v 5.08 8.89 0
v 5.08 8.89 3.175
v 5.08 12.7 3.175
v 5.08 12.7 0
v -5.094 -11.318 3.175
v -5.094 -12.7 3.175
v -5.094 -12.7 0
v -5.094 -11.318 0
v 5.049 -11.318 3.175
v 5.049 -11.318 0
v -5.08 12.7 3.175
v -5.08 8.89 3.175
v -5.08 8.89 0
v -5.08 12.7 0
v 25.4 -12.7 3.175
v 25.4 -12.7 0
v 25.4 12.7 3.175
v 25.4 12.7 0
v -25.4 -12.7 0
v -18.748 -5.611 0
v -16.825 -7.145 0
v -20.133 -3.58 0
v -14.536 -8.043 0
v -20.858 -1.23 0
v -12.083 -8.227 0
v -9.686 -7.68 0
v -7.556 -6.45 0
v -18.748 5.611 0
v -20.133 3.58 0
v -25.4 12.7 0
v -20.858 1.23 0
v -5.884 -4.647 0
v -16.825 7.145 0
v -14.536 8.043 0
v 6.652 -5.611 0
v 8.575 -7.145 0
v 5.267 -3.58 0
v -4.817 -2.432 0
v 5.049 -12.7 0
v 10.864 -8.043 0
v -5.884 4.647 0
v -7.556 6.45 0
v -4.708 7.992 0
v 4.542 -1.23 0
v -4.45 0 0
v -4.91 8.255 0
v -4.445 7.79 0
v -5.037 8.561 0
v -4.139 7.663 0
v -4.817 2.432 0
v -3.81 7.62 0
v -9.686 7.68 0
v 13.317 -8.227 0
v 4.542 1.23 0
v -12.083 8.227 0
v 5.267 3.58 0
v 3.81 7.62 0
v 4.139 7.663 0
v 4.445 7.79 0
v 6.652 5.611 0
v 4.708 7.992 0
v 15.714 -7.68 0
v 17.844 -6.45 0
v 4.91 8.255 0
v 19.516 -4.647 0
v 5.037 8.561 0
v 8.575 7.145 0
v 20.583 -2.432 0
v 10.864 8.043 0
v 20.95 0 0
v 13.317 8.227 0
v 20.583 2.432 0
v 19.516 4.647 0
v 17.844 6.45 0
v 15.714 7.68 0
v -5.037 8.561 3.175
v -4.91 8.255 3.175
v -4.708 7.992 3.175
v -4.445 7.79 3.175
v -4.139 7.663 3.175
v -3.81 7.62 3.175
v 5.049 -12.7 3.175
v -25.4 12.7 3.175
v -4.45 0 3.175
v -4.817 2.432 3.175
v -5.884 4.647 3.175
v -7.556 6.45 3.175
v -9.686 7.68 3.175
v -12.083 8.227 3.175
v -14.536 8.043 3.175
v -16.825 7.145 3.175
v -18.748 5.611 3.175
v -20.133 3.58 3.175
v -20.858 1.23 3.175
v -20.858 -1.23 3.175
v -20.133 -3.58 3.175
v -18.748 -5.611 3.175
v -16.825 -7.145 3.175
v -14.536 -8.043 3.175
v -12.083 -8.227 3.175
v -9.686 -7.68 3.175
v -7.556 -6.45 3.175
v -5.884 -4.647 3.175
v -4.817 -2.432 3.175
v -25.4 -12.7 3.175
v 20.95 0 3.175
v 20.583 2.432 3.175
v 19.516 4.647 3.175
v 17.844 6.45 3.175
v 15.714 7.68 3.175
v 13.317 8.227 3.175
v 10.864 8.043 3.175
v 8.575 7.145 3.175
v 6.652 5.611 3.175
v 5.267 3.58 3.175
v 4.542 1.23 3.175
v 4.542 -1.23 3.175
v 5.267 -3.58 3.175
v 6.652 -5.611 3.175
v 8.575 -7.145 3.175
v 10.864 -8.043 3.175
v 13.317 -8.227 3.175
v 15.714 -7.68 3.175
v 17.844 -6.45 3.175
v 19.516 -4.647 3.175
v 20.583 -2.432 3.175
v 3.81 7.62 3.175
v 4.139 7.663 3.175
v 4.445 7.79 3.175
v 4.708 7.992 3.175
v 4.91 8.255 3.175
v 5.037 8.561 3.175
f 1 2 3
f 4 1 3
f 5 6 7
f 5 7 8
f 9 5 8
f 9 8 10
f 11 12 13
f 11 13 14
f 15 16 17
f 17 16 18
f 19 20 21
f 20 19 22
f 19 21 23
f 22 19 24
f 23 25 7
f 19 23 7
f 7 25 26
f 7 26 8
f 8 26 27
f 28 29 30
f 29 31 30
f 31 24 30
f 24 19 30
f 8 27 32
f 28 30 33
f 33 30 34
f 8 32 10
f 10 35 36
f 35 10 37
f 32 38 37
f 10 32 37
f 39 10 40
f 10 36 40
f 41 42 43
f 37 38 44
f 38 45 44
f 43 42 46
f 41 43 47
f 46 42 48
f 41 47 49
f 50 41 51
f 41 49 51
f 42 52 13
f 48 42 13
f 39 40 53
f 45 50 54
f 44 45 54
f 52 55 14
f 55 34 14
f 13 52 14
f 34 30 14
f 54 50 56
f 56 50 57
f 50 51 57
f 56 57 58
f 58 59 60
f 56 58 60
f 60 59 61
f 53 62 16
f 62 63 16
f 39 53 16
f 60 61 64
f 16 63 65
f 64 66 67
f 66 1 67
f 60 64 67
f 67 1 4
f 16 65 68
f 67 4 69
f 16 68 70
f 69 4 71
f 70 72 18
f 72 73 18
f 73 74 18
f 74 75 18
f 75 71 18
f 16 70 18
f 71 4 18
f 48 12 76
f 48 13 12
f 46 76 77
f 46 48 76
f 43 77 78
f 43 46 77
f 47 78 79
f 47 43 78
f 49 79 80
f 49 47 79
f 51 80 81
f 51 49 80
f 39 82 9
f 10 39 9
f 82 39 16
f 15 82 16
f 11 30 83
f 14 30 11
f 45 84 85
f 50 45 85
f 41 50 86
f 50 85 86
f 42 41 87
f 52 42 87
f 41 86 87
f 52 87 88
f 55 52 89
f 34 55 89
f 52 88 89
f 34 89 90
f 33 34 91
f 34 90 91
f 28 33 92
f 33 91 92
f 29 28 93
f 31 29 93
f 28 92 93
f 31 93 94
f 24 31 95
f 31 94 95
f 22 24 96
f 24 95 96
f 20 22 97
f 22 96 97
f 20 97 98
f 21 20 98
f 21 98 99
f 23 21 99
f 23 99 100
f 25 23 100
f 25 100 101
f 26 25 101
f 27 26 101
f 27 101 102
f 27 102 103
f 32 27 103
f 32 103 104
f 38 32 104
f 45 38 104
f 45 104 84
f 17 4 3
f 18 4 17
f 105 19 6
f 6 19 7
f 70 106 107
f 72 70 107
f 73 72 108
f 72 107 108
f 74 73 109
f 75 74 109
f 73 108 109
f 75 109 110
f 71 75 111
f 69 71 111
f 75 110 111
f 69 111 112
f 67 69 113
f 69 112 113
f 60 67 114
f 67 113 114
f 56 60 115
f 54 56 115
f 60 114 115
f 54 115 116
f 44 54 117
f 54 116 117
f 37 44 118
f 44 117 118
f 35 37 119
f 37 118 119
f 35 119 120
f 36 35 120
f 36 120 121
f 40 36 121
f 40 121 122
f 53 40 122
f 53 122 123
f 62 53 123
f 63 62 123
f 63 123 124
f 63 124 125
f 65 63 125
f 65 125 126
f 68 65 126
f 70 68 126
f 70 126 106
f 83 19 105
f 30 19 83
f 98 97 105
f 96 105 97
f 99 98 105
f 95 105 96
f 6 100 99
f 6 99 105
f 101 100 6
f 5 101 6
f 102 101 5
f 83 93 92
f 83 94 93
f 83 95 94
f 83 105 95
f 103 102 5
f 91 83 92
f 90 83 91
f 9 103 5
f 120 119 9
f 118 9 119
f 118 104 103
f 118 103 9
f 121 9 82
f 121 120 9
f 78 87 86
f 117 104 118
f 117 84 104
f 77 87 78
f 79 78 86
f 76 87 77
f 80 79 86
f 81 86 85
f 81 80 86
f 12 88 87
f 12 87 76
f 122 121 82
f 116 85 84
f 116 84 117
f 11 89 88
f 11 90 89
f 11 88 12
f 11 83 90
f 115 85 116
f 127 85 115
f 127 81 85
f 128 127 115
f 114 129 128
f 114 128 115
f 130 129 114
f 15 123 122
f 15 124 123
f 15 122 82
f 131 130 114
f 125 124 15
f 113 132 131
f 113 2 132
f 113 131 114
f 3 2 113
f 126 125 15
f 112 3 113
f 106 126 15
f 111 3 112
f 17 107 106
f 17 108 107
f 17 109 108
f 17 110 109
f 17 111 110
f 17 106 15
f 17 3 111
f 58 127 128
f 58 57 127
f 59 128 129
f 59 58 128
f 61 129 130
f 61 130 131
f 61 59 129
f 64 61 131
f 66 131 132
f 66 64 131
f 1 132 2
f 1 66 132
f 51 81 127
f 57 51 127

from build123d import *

# Parameters (mm, degrees)
F0_W     = 50.8
F0_H     = 25.4
F1_DEPTH = 3.175
F2_R     = 8.25
F3_DEPTH = 25.4
F4_W     = 10.16
F4_H     = 5.08
F4_W_2   = 10.142652
F4_H_2   = 1.381879
F5_DEPTH = 25.4
F6_R     = 1.27


with BuildPart() as f1:
    # F0 (on Top) → F1 (new body)
    with BuildSketch(Plane.XY):
        Rectangle(F0_W, F0_H)
    extrude(amount=F1_DEPTH)

    # F2 (on face) → F3 (cut)
    with BuildSketch(Plane.XY.offset(3.175)):
        with Locations((-12.7, 0)):
            Circle(F2_R)
        with Locations((12.7, 0)):
            Circle(F2_R)
    extrude(amount=-F3_DEPTH, mode=Mode.SUBTRACT)

    # F4 (on face) → F5 (cut)
    with BuildSketch(Plane.XY.offset(3.175)):
        with Locations((0, 10.16)):
            Rectangle(F4_W, F4_H)
        with Locations((-0.022494, -12.009061)):
            Rectangle(F4_W_2, F4_H_2)
    extrude(amount=-F5_DEPTH, mode=Mode.SUBTRACT)

    # F6
    f6_edges = [f1.edges().sort_by_distance(p)[0] for p in [
        (-5.08, 7.62, 1.5875),
        (5.08, 7.62, 1.5875),
    ]]
    fillet(f6_edges, radius=F6_R)


solid = f1.part
